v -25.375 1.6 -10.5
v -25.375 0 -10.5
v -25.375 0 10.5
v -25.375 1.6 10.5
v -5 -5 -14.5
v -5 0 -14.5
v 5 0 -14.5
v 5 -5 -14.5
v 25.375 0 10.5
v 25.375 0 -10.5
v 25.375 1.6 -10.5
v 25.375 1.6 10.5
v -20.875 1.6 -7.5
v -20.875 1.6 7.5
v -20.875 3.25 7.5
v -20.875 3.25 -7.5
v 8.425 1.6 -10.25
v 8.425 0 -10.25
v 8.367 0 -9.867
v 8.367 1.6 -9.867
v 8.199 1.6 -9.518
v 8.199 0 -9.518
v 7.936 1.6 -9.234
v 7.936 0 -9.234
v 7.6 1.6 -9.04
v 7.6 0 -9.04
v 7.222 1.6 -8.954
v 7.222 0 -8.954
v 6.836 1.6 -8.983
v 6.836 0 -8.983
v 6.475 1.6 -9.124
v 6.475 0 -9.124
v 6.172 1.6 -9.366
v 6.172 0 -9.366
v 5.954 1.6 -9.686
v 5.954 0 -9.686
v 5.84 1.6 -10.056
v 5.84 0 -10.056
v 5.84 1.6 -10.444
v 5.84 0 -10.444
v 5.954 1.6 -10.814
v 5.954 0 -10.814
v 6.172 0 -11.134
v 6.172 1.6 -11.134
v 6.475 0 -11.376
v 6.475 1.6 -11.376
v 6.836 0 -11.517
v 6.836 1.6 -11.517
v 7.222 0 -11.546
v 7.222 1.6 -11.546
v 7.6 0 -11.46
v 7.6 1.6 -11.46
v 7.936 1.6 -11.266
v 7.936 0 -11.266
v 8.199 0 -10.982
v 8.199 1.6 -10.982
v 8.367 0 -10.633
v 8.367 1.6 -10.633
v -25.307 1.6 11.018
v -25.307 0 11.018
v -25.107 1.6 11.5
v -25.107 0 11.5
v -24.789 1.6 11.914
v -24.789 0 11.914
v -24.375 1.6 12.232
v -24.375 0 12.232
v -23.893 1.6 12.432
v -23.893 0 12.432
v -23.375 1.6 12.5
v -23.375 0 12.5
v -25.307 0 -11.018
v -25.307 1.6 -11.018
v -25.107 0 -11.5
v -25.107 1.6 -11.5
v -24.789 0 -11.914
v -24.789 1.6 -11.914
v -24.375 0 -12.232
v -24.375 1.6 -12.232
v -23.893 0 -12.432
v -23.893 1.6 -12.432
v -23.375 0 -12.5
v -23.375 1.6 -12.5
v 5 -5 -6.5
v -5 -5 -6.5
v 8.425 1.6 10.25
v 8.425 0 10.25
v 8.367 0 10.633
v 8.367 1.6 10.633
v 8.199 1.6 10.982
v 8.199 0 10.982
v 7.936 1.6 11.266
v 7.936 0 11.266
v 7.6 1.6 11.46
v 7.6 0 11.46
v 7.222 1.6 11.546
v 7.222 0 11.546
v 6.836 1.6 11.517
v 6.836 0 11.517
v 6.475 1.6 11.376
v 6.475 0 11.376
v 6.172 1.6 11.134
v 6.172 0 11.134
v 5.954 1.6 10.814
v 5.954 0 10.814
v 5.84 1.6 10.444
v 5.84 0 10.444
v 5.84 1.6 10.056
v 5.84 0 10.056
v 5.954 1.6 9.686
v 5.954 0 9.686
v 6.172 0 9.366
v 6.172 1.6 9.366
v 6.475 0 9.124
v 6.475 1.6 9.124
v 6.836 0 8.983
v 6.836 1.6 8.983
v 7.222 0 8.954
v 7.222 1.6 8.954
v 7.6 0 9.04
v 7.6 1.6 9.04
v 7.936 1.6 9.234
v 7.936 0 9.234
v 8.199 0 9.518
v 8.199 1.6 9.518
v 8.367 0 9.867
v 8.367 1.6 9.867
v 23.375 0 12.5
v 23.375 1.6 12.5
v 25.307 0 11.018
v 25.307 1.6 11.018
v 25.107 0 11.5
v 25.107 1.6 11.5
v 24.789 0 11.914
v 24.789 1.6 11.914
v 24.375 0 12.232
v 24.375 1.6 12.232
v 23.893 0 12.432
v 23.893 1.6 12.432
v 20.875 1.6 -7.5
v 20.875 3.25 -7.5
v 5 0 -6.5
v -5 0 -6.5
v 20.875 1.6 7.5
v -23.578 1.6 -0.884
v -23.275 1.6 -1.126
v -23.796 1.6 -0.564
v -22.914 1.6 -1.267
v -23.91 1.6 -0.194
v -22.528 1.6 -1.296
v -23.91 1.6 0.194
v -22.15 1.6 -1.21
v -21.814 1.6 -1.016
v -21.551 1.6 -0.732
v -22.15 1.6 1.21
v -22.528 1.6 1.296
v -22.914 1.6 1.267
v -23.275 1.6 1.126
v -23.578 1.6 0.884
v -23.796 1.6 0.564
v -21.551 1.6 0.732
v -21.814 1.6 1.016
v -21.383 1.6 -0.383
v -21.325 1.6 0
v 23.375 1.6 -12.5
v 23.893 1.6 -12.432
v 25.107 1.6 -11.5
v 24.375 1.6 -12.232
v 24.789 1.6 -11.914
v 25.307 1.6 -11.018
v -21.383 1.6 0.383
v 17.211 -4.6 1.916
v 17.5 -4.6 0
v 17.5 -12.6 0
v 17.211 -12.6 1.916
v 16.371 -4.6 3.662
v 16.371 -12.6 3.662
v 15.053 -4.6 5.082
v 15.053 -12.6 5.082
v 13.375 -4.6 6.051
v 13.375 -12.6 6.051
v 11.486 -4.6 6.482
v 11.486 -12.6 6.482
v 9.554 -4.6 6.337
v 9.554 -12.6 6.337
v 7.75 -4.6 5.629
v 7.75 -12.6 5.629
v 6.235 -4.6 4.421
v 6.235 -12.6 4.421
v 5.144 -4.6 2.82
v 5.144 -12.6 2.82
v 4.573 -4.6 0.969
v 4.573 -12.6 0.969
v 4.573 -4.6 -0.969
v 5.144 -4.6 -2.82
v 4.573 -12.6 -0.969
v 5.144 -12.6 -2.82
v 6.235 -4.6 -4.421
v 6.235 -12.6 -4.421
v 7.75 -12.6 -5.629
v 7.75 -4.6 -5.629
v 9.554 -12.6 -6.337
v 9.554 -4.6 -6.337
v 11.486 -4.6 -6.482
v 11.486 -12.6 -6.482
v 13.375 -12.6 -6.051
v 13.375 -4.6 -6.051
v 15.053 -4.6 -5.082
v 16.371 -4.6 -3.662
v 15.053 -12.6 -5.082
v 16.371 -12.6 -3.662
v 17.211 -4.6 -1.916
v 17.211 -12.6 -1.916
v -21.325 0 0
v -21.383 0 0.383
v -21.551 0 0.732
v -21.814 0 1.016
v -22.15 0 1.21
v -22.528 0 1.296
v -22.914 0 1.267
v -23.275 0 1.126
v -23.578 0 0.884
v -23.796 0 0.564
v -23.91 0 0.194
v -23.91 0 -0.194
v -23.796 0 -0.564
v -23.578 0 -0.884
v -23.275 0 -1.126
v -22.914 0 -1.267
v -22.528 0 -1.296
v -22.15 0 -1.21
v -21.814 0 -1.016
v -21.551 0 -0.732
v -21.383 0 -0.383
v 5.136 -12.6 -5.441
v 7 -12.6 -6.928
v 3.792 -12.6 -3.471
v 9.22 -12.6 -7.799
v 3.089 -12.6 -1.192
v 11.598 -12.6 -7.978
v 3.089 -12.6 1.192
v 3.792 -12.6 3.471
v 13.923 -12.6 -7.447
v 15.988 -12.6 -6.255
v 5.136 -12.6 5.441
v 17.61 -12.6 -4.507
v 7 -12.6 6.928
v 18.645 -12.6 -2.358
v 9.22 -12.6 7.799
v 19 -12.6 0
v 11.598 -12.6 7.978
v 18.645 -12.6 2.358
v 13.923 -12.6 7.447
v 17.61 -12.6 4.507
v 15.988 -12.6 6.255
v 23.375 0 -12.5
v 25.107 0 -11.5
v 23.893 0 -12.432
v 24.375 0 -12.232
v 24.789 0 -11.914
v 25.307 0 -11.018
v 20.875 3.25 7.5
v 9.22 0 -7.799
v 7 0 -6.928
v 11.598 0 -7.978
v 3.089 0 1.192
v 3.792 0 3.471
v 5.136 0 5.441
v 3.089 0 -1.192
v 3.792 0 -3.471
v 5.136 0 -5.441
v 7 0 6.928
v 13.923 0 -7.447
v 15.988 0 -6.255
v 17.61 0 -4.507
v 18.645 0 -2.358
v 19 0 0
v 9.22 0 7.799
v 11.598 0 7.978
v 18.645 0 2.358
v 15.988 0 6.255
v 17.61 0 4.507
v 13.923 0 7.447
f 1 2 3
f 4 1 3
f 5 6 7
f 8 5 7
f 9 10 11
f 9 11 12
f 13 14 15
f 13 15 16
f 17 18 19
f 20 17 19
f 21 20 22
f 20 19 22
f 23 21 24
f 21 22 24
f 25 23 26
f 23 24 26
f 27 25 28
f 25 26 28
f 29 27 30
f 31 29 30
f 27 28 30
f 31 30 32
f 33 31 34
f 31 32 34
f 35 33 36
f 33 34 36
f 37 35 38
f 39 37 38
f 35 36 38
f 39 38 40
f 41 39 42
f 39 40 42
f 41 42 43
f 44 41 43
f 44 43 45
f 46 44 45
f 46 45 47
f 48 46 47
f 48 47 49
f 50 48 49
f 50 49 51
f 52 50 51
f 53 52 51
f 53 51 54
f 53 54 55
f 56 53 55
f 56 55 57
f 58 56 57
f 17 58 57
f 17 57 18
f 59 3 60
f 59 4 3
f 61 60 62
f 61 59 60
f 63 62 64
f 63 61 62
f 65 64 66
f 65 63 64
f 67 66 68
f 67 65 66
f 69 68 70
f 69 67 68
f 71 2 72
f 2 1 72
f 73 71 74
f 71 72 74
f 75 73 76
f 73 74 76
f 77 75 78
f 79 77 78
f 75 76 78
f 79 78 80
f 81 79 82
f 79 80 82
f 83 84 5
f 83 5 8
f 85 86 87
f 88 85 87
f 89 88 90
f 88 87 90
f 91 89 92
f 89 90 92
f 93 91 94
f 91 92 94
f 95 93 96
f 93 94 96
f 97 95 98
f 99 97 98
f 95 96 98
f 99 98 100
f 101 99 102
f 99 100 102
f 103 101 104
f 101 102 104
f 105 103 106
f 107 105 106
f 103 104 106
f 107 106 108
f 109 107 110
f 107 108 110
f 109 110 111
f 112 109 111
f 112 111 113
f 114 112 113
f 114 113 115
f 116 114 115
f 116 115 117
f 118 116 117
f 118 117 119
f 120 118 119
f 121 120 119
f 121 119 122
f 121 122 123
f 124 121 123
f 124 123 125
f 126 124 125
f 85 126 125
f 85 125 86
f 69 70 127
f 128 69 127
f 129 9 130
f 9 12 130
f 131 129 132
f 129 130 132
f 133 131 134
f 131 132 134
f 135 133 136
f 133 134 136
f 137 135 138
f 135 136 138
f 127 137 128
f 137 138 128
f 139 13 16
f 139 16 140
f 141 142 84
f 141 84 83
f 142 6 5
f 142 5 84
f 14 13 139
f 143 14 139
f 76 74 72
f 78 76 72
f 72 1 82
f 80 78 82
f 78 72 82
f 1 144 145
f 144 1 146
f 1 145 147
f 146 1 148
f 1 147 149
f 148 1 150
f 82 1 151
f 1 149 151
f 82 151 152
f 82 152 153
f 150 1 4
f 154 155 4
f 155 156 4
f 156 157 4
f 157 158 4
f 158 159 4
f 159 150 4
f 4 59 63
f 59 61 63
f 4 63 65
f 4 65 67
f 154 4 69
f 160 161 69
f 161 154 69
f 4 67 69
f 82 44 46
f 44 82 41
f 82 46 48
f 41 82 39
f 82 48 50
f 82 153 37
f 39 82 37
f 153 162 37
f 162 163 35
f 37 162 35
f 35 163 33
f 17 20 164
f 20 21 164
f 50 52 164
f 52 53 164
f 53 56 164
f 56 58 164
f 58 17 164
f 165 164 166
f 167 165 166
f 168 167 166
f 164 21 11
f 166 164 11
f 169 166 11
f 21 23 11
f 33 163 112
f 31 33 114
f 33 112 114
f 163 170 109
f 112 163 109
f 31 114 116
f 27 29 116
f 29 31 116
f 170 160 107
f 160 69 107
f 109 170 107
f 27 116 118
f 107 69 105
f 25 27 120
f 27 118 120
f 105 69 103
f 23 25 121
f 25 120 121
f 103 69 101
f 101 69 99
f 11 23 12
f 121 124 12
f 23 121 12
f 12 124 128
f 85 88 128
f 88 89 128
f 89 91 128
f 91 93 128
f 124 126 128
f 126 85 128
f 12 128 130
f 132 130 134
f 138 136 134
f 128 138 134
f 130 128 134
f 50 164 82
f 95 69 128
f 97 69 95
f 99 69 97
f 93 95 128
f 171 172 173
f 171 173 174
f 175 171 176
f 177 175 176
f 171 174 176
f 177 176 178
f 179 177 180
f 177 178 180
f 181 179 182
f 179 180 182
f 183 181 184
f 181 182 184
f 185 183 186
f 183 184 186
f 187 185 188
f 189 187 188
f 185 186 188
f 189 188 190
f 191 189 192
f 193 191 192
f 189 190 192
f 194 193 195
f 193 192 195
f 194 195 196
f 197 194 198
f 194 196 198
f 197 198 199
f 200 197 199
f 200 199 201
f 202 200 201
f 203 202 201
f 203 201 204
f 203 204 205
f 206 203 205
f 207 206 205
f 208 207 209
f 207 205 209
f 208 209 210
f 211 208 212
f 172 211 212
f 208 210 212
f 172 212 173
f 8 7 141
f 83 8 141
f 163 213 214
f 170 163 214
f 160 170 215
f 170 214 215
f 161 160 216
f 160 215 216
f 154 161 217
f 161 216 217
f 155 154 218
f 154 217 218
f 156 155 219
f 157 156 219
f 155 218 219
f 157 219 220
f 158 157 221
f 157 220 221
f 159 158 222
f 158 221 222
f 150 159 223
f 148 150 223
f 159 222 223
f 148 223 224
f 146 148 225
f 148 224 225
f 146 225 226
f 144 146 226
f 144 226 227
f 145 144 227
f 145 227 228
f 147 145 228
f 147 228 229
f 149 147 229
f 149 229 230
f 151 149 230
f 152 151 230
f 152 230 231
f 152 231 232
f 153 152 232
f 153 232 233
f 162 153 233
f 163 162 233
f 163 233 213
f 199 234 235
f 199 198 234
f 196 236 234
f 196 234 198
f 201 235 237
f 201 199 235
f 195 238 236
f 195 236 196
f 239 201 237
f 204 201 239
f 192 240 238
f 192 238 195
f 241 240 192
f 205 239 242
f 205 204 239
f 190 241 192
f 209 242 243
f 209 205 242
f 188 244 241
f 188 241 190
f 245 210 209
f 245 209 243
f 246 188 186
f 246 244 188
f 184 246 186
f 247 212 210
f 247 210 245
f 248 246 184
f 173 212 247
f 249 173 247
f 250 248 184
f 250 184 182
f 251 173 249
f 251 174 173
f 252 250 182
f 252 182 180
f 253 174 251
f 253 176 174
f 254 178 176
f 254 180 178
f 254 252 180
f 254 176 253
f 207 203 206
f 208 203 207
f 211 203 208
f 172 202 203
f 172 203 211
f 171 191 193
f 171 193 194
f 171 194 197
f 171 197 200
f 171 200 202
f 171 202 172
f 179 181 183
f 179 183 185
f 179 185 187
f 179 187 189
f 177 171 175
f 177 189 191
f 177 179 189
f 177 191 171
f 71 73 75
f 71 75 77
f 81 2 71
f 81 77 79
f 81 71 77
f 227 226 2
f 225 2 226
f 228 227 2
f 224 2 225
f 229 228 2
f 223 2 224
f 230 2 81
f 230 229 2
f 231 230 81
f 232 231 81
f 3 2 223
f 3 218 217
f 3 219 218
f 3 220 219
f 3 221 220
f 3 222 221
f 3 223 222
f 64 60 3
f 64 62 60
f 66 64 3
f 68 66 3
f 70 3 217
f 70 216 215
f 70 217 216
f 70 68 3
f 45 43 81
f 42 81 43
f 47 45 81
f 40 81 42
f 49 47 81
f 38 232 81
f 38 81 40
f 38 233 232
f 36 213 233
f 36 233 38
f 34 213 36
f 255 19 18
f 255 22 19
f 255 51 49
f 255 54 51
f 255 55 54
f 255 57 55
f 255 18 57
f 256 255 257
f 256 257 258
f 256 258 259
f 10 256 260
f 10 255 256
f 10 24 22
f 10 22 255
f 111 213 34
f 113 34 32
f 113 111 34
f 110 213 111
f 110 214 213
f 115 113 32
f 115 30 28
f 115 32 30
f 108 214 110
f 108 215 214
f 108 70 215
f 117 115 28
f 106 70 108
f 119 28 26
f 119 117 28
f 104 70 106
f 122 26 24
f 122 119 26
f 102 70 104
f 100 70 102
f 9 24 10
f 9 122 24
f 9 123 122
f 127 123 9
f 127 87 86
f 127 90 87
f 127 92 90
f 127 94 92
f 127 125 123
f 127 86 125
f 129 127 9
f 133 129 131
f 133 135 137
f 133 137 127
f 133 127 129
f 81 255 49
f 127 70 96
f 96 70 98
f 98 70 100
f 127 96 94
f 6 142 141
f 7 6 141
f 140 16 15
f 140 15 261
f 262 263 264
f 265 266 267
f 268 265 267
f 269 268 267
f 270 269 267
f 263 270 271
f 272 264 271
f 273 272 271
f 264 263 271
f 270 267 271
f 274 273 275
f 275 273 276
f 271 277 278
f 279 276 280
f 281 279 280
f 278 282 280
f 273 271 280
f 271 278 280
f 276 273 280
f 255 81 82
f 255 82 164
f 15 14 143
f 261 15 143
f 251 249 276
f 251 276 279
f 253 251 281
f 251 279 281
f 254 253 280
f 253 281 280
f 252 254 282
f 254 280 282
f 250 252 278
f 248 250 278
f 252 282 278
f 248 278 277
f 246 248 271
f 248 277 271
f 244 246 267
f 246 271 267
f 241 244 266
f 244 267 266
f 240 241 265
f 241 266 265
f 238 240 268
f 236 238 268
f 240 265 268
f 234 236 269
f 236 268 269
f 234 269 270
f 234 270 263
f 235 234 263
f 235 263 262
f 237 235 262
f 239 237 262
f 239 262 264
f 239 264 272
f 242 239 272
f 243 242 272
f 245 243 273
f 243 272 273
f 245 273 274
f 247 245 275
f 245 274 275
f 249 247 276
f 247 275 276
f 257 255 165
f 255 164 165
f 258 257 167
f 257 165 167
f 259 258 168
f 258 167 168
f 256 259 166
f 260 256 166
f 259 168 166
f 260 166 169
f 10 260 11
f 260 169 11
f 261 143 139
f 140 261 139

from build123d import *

# Parameters (mm, degrees)
SKETCH_W        = 50.75
SKETCH_H        = 25
PAD_DEPTH       = 1.6
FILLET_R        = 2
SKETCH001_R     = 1.3
POCKET_DEPTH    = 1.601
SKETCH002_R     = 8
PAD001_DEPTH    = 12.6
SKETCH003_R     = 6.5
POCKET001_DEPTH = 8
SKETCH004_W     = 10
SKETCH004_H     = 8
PAD002_DEPTH    = 5
SKETCH005_W     = 41.75
SKETCH005_H     = 15
PAD003_DEPTH    = 1.65


with BuildPart() as mainplate:
    # Sketch → Pad (new body)
    with BuildSketch(Plane.XZ):
        Rectangle(SKETCH_W, SKETCH_H)
    extrude(amount=-PAD_DEPTH)

    # Fillet
    fillet_edges = [mainplate.edges().sort_by_distance(p)[0] for p in [
        (25.375, 0.8, 12.5),
        (-25.375, 0.8, 12.5),
        (-25.375, 0.8, -12.5),
        (25.375, 0.8, -12.5),
    ]]
    fillet(fillet_edges, radius=FILLET_R)

    # Sketch001 → Pocket (cut, through all)
    with BuildSketch(Plane.XZ):
        with Locations((-22.625, 0)):
            Circle(SKETCH001_R)
        with Locations((7.125, 10.25)):
            Circle(SKETCH001_R)
        with Locations((7.125, -10.25)):
            Circle(SKETCH001_R)
    extrude(amount=-POCKET_DEPTH, mode=Mode.SUBTRACT)


with BuildPart() as usprober:
    # Sketch002 → Pad001 (new body)
    with BuildSketch(Plane.XZ):
        with Locations((-11, 0)):
            Circle(SKETCH002_R)
    extrude(amount=PAD001_DEPTH)

    # Sketch003 (on Face3 of Pad001) → Pocket001 (cut)
    with BuildSketch(Plane.XZ.offset(12.6)):
        with Locations((-11, 0)):
            Circle(SKETCH003_R)
    extrude(amount=-POCKET001_DEPTH, mode=Mode.SUBTRACT)


with BuildPart() as usprober_1:
    # Body002 placement: moved
    add(usprober.part.moved(Location((22, 0, 0))))


with BuildPart() as groveconnector:
    # Sketch004 → Pad002 (new body)
    with BuildSketch(Plane.XZ):
        with Locations((0, -10.5)):
            Rectangle(SKETCH004_W, SKETCH004_H)
    extrude(amount=PAD002_DEPTH)


with BuildPart() as chips:
    # Sketch005 (on Face1 of CopyPocket) → Pad003 (new body)
    with BuildSketch(Plane(origin=(0, 1.6, 0), x_dir=(1, 0, 0), z_dir=(0, 1, 0))):
        Rectangle(SKETCH005_W, SKETCH005_H)
    extrude(amount=PAD003_DEPTH)


solid = Compound([mainplate.part, usprober_1.part, groveconnector.part, chips.part])
